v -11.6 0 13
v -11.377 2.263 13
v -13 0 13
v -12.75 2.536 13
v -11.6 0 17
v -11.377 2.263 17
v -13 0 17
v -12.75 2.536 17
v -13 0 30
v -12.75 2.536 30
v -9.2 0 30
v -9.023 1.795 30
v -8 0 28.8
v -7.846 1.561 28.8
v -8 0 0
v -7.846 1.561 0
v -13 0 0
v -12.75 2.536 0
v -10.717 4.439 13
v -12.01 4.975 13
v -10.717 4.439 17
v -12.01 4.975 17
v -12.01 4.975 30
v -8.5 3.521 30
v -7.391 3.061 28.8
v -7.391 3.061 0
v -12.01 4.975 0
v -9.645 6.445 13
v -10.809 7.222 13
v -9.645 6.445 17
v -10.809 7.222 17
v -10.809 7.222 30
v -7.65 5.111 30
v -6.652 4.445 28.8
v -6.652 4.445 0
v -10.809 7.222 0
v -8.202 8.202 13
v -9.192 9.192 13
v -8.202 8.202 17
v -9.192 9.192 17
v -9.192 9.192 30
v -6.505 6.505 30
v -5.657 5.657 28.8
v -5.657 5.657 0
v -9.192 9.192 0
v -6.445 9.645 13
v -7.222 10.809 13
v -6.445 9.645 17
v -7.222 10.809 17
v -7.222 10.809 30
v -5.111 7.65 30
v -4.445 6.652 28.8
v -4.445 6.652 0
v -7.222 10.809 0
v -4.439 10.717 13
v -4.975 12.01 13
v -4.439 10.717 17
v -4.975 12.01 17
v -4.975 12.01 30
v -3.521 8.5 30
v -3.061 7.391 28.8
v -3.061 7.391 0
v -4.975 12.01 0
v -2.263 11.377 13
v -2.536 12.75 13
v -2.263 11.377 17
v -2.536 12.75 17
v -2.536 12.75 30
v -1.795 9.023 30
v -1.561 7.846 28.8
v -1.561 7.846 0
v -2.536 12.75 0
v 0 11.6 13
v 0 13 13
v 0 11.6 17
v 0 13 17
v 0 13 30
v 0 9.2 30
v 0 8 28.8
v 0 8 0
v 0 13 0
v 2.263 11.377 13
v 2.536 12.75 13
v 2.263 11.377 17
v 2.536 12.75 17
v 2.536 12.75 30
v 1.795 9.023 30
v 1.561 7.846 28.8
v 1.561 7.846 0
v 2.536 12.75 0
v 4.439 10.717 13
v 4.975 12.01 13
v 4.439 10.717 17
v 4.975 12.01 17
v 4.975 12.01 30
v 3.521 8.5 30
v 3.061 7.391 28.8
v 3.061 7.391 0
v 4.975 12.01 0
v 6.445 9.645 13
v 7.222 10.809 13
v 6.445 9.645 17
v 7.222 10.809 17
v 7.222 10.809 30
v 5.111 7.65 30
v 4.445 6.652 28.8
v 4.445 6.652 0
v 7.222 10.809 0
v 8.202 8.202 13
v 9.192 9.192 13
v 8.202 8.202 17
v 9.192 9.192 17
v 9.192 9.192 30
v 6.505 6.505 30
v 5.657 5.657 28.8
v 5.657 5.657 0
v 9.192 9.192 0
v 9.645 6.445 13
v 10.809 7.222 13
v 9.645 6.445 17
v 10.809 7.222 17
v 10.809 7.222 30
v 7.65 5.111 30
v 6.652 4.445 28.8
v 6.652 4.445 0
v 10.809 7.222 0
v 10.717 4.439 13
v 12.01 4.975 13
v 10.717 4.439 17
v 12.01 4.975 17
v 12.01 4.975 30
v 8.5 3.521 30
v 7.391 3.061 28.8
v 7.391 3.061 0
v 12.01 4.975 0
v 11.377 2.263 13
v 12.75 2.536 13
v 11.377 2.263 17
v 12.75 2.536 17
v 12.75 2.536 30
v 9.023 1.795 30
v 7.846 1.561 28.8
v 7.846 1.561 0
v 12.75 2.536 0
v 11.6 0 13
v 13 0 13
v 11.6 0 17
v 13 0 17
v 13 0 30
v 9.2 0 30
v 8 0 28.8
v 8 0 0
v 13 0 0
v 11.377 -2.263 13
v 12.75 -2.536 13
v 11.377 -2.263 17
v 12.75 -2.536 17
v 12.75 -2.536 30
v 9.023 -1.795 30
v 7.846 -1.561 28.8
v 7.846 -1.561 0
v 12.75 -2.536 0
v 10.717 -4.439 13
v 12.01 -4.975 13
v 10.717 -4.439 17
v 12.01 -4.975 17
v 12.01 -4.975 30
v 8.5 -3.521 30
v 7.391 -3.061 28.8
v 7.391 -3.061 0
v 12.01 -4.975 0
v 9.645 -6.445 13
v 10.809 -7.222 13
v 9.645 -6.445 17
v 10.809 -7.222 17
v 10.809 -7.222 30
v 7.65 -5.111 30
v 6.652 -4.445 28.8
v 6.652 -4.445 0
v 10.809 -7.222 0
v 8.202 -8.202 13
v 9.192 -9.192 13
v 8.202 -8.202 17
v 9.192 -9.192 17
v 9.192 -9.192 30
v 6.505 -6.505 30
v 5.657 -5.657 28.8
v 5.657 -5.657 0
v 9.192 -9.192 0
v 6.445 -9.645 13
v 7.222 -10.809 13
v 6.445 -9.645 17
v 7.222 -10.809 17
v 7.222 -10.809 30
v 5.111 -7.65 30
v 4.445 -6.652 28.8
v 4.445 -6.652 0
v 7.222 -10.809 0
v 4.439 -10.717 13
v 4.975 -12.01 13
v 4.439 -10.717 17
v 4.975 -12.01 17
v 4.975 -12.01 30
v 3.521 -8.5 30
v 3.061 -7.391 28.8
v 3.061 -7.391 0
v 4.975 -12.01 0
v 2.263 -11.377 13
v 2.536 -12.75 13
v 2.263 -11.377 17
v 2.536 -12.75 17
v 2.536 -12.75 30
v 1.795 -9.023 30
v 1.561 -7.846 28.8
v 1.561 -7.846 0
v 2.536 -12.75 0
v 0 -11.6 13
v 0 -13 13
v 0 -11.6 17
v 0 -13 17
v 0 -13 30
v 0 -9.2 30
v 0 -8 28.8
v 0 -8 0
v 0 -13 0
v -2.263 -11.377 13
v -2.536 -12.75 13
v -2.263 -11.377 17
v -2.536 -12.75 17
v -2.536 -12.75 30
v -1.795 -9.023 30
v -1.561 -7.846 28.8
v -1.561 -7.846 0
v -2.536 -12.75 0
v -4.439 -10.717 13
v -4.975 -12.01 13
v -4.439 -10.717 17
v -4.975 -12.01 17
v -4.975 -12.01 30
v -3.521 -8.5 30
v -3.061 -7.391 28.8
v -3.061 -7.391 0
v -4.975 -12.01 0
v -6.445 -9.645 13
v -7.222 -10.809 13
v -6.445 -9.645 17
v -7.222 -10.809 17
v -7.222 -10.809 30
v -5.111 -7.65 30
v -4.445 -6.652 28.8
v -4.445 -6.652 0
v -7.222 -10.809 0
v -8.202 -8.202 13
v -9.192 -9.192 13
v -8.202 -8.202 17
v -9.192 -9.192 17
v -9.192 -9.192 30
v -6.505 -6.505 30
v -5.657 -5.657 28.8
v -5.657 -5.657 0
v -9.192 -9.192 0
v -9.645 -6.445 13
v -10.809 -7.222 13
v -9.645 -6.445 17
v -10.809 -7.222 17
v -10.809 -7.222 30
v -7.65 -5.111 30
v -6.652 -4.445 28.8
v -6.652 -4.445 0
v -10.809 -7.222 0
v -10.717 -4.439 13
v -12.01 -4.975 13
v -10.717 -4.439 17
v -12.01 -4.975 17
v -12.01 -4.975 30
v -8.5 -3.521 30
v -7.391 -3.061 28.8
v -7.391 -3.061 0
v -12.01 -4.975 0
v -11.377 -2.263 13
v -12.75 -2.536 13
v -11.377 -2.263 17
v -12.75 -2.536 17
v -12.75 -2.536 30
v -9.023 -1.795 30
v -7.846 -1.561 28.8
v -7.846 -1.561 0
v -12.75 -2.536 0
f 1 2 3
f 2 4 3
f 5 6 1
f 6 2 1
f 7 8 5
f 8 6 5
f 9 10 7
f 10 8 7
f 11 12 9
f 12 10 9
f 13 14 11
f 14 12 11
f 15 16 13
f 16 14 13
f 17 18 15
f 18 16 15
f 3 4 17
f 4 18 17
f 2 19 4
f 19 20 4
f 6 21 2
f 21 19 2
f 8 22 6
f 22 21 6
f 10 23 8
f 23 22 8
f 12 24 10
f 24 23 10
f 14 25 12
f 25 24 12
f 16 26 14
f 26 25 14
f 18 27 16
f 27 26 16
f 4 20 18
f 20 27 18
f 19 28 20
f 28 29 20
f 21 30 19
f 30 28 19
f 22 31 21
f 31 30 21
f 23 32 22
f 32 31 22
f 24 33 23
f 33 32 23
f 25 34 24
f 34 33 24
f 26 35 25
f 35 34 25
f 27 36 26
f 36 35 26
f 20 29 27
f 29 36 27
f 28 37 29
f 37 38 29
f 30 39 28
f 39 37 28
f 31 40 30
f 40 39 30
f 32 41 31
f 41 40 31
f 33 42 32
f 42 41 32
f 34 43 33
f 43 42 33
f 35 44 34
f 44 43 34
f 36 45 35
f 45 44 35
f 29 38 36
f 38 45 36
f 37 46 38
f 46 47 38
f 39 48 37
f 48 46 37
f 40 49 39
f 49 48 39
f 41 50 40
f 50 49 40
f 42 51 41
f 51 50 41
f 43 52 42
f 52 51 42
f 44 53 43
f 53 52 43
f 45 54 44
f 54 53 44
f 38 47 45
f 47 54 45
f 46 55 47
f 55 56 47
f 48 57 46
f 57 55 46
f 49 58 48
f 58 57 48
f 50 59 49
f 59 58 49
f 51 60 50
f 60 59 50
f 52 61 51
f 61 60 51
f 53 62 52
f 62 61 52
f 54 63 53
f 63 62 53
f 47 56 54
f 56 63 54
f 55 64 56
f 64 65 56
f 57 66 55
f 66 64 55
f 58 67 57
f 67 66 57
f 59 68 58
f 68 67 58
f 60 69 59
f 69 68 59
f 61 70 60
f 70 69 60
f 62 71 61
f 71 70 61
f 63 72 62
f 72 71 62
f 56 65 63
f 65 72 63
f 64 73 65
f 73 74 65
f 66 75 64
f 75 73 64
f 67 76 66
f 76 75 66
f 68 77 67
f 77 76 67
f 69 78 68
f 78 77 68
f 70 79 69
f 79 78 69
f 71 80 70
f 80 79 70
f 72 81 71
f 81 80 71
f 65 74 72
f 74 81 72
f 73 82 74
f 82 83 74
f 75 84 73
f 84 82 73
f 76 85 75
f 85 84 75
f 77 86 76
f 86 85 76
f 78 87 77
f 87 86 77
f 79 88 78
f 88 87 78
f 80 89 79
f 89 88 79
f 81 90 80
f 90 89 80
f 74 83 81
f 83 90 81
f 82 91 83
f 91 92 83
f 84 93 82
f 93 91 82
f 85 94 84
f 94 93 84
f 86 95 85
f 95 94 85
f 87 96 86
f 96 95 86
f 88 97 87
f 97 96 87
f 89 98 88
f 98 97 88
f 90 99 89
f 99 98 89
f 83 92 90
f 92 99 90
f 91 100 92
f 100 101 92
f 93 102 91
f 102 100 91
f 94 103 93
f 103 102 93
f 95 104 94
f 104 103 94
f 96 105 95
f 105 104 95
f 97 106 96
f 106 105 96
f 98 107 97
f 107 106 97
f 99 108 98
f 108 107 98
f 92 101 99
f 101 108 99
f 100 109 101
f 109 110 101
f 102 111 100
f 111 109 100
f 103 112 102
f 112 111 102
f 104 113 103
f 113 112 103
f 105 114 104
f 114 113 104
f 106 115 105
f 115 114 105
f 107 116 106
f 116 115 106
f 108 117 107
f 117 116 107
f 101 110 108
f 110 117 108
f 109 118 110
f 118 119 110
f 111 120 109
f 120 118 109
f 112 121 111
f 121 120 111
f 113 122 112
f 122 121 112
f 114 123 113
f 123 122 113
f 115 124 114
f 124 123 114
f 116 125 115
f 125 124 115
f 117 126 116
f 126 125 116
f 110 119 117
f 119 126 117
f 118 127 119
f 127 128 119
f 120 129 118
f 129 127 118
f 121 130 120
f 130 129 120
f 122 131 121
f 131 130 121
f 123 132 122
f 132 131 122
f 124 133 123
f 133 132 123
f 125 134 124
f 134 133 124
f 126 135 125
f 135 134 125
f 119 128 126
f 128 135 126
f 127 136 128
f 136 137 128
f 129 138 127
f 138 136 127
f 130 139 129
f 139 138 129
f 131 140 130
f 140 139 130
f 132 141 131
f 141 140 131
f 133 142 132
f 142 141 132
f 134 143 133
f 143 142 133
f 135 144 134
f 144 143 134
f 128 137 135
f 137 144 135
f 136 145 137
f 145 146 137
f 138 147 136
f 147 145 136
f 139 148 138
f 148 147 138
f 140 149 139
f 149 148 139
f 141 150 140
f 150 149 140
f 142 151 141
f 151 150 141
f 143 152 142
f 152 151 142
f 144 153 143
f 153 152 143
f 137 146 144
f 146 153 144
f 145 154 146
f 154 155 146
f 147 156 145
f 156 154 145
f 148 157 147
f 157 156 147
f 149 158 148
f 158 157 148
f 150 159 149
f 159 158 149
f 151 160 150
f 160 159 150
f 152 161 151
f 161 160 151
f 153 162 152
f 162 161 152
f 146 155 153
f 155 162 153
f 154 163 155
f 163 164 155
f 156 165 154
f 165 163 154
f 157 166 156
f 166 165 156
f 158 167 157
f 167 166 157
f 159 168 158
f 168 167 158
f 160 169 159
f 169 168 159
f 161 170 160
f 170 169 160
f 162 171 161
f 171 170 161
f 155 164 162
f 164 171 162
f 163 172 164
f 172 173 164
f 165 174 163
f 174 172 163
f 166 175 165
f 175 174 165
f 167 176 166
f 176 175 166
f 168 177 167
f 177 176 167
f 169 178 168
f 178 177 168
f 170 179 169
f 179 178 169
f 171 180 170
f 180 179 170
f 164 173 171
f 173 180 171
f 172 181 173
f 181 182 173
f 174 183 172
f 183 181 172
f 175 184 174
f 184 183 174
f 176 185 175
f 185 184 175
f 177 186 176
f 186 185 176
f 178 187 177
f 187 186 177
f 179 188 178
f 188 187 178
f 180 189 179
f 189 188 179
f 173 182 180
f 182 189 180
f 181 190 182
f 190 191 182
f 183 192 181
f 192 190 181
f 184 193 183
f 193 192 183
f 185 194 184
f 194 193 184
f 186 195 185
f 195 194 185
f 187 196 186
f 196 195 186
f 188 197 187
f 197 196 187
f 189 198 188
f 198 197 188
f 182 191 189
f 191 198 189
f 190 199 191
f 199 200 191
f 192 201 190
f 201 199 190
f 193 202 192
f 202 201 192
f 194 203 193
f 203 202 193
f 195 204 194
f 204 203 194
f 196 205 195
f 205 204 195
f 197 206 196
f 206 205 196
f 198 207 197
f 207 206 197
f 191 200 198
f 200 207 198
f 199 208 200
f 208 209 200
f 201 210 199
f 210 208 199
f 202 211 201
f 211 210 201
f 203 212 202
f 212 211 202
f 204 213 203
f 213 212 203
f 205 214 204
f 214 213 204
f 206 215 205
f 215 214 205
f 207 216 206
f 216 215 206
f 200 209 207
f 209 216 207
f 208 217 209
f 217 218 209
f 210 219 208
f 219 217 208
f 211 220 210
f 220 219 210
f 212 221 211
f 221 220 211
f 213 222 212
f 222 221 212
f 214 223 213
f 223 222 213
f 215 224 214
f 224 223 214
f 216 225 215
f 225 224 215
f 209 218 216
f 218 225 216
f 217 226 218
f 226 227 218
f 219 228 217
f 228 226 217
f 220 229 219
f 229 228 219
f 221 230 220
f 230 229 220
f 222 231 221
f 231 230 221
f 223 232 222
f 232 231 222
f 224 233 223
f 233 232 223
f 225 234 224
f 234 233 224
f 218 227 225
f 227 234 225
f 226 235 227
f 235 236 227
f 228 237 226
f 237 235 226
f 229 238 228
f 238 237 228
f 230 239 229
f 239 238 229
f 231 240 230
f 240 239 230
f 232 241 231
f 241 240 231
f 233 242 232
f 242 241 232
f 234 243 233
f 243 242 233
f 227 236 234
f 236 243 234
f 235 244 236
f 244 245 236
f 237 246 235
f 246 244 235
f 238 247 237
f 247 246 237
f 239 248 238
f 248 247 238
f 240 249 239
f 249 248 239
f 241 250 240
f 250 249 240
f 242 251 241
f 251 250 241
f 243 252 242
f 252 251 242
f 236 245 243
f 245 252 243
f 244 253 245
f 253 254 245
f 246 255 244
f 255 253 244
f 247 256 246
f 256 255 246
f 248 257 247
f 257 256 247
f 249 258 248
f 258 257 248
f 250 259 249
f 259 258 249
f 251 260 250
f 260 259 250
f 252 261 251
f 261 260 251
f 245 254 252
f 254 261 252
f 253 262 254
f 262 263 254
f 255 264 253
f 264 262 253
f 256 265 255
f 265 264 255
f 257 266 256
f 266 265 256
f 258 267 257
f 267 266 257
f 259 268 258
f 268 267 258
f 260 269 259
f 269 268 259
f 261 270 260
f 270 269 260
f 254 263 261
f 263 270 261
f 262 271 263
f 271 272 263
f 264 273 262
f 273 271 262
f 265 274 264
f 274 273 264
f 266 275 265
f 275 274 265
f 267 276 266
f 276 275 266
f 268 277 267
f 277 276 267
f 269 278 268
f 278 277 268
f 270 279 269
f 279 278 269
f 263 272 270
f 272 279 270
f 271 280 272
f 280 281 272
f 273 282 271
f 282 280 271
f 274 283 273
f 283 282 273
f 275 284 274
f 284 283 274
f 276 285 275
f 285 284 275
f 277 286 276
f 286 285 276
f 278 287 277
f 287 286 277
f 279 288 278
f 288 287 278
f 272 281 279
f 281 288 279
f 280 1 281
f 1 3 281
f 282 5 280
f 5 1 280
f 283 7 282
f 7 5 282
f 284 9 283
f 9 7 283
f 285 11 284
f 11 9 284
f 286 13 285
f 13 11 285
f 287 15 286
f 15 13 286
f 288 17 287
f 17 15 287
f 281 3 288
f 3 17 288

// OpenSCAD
$fn = 32;

// ----------------------------------------------------------------------
// Grooved revolve: thread_relief, bore R8
// ----------------------------------------------------------------------

// --- parameters (mm) ---
bore_r = 8;               // bore radius
outer_r = 13;             // outer radius of the body
total_h = 30;             // overall height, Z
wall = 5;                 // radial wall thickness
groove_w = 4;             // groove width
groove_d = 1.4;           // groove depth
grooves = 1;              // number of outer grooves
relief = 1.2;             // thread relief leg at the bore mouth
relief_angle = 45;        // thread relief chamfer angle, degrees

bbox_x = 2 * outer_r;  // full diameter
bore_d = 2 * bore_r;  // bore diameter
body_d = 2 * outer_r;  // body diameter
revolve_angle = 360;  // full turn around the Z axis

profile = [[8, 0], [13, 0], [13, 13], [11.6, 13], [11.6, 17], [13, 17], [13, 30], [9.2, 30], [8, 28.8]];  // primary outline, 9 points, counter clockwise

// --- the one profile operation ---
rotate_extrude(angle = revolve_angle) polygon(points = profile);
